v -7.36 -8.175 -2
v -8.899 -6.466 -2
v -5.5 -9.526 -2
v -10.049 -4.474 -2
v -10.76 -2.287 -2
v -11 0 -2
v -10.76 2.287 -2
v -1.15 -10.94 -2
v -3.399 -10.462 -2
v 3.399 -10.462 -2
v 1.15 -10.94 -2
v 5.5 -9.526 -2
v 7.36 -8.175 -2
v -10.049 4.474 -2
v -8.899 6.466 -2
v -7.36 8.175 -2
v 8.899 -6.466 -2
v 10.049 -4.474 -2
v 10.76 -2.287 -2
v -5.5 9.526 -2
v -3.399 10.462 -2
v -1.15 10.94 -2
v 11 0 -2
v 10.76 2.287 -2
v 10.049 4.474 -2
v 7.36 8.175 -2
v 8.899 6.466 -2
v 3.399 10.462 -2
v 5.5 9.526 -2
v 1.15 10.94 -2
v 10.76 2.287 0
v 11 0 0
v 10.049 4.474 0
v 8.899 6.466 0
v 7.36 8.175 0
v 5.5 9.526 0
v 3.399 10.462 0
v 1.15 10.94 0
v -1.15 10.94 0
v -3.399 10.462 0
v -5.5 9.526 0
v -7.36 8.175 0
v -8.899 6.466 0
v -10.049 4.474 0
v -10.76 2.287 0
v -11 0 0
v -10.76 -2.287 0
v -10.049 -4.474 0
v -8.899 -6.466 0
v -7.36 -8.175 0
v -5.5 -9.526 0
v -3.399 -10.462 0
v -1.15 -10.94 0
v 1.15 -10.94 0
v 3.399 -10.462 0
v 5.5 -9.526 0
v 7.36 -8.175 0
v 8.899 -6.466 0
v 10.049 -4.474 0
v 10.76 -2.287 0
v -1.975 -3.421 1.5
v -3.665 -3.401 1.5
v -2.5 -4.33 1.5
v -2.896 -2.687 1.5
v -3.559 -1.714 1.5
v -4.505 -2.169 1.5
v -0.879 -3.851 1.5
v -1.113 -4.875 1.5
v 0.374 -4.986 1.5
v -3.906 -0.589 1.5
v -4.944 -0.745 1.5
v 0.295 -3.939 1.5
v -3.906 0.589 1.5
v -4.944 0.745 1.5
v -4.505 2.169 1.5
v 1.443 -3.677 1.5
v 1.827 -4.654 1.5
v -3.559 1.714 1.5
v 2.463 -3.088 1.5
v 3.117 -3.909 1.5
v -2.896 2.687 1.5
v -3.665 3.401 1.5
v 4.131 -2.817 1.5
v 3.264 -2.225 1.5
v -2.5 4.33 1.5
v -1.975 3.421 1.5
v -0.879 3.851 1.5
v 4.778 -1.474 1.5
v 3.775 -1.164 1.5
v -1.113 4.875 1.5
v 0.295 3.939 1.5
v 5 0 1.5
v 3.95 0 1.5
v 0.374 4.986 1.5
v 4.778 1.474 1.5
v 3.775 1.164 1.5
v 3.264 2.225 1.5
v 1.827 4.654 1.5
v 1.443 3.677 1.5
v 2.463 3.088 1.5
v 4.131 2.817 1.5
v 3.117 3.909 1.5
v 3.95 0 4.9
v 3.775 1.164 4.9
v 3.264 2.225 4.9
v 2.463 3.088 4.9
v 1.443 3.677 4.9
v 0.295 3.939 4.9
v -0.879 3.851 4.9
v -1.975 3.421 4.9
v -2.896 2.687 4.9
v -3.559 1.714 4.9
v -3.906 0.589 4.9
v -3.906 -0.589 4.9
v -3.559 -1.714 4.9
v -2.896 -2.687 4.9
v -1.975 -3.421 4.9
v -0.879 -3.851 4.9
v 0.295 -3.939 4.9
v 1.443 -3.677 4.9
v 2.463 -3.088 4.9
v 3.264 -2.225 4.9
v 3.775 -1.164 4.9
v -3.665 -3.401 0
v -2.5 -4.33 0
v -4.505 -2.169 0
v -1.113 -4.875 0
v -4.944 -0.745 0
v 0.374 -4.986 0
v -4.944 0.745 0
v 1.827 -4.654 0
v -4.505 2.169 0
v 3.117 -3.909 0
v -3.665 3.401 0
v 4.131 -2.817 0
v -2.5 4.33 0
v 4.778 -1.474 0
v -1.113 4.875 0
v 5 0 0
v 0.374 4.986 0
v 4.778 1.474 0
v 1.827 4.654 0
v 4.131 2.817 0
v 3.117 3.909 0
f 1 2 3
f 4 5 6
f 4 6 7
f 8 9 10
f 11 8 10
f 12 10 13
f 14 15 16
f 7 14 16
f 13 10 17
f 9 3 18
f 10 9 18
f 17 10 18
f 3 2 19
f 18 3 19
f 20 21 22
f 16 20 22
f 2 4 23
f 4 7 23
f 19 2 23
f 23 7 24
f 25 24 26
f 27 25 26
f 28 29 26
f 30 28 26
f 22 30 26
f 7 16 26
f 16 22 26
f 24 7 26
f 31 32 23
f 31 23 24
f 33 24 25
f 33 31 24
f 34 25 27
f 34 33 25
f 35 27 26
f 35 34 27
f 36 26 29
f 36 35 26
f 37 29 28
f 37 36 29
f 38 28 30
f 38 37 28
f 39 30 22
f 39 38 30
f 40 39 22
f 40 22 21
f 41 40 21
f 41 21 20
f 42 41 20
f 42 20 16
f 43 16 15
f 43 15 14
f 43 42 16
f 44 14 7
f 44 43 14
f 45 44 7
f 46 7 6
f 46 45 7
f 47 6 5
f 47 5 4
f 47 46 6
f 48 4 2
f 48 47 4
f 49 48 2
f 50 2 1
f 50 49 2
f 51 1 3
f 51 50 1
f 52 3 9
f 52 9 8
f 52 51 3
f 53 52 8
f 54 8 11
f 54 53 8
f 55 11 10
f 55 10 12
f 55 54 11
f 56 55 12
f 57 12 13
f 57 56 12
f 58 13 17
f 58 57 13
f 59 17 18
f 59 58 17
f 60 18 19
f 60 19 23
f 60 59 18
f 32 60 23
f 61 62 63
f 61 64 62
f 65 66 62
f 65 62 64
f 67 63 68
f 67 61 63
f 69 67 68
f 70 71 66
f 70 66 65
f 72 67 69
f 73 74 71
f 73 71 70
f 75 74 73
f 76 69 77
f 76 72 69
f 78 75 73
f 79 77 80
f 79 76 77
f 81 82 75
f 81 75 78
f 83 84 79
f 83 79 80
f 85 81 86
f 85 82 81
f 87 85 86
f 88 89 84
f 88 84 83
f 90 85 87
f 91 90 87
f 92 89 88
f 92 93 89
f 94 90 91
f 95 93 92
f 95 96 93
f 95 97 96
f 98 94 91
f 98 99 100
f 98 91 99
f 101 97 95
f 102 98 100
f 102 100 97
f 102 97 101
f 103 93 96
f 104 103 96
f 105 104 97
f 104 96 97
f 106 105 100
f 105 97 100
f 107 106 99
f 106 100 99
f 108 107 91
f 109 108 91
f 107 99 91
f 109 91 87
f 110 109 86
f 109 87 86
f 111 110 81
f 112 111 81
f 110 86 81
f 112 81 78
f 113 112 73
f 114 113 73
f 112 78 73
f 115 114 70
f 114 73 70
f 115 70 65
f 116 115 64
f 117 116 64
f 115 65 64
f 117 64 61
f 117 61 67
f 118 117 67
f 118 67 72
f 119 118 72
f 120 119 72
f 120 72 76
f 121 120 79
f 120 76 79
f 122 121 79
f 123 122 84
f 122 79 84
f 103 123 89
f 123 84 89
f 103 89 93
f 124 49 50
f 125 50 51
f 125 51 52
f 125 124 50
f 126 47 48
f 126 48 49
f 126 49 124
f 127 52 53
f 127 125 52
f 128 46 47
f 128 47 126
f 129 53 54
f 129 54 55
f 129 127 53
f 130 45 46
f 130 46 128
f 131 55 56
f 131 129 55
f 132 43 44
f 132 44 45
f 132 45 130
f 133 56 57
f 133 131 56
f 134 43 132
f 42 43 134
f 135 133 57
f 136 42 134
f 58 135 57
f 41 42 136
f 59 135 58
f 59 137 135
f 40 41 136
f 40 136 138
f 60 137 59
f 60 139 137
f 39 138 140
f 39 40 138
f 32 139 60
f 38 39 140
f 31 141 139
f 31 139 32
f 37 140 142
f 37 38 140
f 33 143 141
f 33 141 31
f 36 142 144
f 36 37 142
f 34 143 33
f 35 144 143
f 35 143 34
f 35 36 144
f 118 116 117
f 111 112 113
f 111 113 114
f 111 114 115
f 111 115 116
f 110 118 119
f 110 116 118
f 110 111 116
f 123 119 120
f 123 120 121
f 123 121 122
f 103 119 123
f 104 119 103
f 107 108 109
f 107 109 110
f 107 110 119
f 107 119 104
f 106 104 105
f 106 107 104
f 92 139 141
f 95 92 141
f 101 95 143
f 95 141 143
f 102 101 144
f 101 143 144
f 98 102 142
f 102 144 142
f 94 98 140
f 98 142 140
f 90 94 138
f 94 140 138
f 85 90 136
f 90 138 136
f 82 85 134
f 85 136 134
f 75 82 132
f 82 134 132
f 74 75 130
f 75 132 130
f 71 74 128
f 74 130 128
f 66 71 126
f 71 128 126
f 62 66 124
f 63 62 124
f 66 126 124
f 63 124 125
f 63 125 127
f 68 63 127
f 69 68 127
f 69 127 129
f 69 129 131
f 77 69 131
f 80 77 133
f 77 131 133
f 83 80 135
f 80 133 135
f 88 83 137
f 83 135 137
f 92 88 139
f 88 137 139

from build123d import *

# Parameters (mm, degrees)
F0_R     = 11
F0_R_2   = 5
F1_DEPTH = 2
F2_DEPTH = 1.5
F3_R     = 3.95
F4_DEPTH = 3.4


with BuildPart() as f1:
    # F0 (on Top) → F1 (new body)
    with BuildSketch(Plane.XY):
        Circle(F0_R)
        Circle(F0_R_2, mode=Mode.SUBTRACT)
        Circle(F0_R_2)
    extrude(amount=-F1_DEPTH)

    # F0 (on Top) → F2 (join)
    with BuildSketch(Plane.XY):
        Circle(F0_R_2)
    extrude(amount=F2_DEPTH)

    # F3 (on face) → F4 (join)
    with BuildSketch(Plane.XY.offset(1.5)):
        Circle(F3_R)
    extrude(amount=F4_DEPTH)


solid = f1.part
